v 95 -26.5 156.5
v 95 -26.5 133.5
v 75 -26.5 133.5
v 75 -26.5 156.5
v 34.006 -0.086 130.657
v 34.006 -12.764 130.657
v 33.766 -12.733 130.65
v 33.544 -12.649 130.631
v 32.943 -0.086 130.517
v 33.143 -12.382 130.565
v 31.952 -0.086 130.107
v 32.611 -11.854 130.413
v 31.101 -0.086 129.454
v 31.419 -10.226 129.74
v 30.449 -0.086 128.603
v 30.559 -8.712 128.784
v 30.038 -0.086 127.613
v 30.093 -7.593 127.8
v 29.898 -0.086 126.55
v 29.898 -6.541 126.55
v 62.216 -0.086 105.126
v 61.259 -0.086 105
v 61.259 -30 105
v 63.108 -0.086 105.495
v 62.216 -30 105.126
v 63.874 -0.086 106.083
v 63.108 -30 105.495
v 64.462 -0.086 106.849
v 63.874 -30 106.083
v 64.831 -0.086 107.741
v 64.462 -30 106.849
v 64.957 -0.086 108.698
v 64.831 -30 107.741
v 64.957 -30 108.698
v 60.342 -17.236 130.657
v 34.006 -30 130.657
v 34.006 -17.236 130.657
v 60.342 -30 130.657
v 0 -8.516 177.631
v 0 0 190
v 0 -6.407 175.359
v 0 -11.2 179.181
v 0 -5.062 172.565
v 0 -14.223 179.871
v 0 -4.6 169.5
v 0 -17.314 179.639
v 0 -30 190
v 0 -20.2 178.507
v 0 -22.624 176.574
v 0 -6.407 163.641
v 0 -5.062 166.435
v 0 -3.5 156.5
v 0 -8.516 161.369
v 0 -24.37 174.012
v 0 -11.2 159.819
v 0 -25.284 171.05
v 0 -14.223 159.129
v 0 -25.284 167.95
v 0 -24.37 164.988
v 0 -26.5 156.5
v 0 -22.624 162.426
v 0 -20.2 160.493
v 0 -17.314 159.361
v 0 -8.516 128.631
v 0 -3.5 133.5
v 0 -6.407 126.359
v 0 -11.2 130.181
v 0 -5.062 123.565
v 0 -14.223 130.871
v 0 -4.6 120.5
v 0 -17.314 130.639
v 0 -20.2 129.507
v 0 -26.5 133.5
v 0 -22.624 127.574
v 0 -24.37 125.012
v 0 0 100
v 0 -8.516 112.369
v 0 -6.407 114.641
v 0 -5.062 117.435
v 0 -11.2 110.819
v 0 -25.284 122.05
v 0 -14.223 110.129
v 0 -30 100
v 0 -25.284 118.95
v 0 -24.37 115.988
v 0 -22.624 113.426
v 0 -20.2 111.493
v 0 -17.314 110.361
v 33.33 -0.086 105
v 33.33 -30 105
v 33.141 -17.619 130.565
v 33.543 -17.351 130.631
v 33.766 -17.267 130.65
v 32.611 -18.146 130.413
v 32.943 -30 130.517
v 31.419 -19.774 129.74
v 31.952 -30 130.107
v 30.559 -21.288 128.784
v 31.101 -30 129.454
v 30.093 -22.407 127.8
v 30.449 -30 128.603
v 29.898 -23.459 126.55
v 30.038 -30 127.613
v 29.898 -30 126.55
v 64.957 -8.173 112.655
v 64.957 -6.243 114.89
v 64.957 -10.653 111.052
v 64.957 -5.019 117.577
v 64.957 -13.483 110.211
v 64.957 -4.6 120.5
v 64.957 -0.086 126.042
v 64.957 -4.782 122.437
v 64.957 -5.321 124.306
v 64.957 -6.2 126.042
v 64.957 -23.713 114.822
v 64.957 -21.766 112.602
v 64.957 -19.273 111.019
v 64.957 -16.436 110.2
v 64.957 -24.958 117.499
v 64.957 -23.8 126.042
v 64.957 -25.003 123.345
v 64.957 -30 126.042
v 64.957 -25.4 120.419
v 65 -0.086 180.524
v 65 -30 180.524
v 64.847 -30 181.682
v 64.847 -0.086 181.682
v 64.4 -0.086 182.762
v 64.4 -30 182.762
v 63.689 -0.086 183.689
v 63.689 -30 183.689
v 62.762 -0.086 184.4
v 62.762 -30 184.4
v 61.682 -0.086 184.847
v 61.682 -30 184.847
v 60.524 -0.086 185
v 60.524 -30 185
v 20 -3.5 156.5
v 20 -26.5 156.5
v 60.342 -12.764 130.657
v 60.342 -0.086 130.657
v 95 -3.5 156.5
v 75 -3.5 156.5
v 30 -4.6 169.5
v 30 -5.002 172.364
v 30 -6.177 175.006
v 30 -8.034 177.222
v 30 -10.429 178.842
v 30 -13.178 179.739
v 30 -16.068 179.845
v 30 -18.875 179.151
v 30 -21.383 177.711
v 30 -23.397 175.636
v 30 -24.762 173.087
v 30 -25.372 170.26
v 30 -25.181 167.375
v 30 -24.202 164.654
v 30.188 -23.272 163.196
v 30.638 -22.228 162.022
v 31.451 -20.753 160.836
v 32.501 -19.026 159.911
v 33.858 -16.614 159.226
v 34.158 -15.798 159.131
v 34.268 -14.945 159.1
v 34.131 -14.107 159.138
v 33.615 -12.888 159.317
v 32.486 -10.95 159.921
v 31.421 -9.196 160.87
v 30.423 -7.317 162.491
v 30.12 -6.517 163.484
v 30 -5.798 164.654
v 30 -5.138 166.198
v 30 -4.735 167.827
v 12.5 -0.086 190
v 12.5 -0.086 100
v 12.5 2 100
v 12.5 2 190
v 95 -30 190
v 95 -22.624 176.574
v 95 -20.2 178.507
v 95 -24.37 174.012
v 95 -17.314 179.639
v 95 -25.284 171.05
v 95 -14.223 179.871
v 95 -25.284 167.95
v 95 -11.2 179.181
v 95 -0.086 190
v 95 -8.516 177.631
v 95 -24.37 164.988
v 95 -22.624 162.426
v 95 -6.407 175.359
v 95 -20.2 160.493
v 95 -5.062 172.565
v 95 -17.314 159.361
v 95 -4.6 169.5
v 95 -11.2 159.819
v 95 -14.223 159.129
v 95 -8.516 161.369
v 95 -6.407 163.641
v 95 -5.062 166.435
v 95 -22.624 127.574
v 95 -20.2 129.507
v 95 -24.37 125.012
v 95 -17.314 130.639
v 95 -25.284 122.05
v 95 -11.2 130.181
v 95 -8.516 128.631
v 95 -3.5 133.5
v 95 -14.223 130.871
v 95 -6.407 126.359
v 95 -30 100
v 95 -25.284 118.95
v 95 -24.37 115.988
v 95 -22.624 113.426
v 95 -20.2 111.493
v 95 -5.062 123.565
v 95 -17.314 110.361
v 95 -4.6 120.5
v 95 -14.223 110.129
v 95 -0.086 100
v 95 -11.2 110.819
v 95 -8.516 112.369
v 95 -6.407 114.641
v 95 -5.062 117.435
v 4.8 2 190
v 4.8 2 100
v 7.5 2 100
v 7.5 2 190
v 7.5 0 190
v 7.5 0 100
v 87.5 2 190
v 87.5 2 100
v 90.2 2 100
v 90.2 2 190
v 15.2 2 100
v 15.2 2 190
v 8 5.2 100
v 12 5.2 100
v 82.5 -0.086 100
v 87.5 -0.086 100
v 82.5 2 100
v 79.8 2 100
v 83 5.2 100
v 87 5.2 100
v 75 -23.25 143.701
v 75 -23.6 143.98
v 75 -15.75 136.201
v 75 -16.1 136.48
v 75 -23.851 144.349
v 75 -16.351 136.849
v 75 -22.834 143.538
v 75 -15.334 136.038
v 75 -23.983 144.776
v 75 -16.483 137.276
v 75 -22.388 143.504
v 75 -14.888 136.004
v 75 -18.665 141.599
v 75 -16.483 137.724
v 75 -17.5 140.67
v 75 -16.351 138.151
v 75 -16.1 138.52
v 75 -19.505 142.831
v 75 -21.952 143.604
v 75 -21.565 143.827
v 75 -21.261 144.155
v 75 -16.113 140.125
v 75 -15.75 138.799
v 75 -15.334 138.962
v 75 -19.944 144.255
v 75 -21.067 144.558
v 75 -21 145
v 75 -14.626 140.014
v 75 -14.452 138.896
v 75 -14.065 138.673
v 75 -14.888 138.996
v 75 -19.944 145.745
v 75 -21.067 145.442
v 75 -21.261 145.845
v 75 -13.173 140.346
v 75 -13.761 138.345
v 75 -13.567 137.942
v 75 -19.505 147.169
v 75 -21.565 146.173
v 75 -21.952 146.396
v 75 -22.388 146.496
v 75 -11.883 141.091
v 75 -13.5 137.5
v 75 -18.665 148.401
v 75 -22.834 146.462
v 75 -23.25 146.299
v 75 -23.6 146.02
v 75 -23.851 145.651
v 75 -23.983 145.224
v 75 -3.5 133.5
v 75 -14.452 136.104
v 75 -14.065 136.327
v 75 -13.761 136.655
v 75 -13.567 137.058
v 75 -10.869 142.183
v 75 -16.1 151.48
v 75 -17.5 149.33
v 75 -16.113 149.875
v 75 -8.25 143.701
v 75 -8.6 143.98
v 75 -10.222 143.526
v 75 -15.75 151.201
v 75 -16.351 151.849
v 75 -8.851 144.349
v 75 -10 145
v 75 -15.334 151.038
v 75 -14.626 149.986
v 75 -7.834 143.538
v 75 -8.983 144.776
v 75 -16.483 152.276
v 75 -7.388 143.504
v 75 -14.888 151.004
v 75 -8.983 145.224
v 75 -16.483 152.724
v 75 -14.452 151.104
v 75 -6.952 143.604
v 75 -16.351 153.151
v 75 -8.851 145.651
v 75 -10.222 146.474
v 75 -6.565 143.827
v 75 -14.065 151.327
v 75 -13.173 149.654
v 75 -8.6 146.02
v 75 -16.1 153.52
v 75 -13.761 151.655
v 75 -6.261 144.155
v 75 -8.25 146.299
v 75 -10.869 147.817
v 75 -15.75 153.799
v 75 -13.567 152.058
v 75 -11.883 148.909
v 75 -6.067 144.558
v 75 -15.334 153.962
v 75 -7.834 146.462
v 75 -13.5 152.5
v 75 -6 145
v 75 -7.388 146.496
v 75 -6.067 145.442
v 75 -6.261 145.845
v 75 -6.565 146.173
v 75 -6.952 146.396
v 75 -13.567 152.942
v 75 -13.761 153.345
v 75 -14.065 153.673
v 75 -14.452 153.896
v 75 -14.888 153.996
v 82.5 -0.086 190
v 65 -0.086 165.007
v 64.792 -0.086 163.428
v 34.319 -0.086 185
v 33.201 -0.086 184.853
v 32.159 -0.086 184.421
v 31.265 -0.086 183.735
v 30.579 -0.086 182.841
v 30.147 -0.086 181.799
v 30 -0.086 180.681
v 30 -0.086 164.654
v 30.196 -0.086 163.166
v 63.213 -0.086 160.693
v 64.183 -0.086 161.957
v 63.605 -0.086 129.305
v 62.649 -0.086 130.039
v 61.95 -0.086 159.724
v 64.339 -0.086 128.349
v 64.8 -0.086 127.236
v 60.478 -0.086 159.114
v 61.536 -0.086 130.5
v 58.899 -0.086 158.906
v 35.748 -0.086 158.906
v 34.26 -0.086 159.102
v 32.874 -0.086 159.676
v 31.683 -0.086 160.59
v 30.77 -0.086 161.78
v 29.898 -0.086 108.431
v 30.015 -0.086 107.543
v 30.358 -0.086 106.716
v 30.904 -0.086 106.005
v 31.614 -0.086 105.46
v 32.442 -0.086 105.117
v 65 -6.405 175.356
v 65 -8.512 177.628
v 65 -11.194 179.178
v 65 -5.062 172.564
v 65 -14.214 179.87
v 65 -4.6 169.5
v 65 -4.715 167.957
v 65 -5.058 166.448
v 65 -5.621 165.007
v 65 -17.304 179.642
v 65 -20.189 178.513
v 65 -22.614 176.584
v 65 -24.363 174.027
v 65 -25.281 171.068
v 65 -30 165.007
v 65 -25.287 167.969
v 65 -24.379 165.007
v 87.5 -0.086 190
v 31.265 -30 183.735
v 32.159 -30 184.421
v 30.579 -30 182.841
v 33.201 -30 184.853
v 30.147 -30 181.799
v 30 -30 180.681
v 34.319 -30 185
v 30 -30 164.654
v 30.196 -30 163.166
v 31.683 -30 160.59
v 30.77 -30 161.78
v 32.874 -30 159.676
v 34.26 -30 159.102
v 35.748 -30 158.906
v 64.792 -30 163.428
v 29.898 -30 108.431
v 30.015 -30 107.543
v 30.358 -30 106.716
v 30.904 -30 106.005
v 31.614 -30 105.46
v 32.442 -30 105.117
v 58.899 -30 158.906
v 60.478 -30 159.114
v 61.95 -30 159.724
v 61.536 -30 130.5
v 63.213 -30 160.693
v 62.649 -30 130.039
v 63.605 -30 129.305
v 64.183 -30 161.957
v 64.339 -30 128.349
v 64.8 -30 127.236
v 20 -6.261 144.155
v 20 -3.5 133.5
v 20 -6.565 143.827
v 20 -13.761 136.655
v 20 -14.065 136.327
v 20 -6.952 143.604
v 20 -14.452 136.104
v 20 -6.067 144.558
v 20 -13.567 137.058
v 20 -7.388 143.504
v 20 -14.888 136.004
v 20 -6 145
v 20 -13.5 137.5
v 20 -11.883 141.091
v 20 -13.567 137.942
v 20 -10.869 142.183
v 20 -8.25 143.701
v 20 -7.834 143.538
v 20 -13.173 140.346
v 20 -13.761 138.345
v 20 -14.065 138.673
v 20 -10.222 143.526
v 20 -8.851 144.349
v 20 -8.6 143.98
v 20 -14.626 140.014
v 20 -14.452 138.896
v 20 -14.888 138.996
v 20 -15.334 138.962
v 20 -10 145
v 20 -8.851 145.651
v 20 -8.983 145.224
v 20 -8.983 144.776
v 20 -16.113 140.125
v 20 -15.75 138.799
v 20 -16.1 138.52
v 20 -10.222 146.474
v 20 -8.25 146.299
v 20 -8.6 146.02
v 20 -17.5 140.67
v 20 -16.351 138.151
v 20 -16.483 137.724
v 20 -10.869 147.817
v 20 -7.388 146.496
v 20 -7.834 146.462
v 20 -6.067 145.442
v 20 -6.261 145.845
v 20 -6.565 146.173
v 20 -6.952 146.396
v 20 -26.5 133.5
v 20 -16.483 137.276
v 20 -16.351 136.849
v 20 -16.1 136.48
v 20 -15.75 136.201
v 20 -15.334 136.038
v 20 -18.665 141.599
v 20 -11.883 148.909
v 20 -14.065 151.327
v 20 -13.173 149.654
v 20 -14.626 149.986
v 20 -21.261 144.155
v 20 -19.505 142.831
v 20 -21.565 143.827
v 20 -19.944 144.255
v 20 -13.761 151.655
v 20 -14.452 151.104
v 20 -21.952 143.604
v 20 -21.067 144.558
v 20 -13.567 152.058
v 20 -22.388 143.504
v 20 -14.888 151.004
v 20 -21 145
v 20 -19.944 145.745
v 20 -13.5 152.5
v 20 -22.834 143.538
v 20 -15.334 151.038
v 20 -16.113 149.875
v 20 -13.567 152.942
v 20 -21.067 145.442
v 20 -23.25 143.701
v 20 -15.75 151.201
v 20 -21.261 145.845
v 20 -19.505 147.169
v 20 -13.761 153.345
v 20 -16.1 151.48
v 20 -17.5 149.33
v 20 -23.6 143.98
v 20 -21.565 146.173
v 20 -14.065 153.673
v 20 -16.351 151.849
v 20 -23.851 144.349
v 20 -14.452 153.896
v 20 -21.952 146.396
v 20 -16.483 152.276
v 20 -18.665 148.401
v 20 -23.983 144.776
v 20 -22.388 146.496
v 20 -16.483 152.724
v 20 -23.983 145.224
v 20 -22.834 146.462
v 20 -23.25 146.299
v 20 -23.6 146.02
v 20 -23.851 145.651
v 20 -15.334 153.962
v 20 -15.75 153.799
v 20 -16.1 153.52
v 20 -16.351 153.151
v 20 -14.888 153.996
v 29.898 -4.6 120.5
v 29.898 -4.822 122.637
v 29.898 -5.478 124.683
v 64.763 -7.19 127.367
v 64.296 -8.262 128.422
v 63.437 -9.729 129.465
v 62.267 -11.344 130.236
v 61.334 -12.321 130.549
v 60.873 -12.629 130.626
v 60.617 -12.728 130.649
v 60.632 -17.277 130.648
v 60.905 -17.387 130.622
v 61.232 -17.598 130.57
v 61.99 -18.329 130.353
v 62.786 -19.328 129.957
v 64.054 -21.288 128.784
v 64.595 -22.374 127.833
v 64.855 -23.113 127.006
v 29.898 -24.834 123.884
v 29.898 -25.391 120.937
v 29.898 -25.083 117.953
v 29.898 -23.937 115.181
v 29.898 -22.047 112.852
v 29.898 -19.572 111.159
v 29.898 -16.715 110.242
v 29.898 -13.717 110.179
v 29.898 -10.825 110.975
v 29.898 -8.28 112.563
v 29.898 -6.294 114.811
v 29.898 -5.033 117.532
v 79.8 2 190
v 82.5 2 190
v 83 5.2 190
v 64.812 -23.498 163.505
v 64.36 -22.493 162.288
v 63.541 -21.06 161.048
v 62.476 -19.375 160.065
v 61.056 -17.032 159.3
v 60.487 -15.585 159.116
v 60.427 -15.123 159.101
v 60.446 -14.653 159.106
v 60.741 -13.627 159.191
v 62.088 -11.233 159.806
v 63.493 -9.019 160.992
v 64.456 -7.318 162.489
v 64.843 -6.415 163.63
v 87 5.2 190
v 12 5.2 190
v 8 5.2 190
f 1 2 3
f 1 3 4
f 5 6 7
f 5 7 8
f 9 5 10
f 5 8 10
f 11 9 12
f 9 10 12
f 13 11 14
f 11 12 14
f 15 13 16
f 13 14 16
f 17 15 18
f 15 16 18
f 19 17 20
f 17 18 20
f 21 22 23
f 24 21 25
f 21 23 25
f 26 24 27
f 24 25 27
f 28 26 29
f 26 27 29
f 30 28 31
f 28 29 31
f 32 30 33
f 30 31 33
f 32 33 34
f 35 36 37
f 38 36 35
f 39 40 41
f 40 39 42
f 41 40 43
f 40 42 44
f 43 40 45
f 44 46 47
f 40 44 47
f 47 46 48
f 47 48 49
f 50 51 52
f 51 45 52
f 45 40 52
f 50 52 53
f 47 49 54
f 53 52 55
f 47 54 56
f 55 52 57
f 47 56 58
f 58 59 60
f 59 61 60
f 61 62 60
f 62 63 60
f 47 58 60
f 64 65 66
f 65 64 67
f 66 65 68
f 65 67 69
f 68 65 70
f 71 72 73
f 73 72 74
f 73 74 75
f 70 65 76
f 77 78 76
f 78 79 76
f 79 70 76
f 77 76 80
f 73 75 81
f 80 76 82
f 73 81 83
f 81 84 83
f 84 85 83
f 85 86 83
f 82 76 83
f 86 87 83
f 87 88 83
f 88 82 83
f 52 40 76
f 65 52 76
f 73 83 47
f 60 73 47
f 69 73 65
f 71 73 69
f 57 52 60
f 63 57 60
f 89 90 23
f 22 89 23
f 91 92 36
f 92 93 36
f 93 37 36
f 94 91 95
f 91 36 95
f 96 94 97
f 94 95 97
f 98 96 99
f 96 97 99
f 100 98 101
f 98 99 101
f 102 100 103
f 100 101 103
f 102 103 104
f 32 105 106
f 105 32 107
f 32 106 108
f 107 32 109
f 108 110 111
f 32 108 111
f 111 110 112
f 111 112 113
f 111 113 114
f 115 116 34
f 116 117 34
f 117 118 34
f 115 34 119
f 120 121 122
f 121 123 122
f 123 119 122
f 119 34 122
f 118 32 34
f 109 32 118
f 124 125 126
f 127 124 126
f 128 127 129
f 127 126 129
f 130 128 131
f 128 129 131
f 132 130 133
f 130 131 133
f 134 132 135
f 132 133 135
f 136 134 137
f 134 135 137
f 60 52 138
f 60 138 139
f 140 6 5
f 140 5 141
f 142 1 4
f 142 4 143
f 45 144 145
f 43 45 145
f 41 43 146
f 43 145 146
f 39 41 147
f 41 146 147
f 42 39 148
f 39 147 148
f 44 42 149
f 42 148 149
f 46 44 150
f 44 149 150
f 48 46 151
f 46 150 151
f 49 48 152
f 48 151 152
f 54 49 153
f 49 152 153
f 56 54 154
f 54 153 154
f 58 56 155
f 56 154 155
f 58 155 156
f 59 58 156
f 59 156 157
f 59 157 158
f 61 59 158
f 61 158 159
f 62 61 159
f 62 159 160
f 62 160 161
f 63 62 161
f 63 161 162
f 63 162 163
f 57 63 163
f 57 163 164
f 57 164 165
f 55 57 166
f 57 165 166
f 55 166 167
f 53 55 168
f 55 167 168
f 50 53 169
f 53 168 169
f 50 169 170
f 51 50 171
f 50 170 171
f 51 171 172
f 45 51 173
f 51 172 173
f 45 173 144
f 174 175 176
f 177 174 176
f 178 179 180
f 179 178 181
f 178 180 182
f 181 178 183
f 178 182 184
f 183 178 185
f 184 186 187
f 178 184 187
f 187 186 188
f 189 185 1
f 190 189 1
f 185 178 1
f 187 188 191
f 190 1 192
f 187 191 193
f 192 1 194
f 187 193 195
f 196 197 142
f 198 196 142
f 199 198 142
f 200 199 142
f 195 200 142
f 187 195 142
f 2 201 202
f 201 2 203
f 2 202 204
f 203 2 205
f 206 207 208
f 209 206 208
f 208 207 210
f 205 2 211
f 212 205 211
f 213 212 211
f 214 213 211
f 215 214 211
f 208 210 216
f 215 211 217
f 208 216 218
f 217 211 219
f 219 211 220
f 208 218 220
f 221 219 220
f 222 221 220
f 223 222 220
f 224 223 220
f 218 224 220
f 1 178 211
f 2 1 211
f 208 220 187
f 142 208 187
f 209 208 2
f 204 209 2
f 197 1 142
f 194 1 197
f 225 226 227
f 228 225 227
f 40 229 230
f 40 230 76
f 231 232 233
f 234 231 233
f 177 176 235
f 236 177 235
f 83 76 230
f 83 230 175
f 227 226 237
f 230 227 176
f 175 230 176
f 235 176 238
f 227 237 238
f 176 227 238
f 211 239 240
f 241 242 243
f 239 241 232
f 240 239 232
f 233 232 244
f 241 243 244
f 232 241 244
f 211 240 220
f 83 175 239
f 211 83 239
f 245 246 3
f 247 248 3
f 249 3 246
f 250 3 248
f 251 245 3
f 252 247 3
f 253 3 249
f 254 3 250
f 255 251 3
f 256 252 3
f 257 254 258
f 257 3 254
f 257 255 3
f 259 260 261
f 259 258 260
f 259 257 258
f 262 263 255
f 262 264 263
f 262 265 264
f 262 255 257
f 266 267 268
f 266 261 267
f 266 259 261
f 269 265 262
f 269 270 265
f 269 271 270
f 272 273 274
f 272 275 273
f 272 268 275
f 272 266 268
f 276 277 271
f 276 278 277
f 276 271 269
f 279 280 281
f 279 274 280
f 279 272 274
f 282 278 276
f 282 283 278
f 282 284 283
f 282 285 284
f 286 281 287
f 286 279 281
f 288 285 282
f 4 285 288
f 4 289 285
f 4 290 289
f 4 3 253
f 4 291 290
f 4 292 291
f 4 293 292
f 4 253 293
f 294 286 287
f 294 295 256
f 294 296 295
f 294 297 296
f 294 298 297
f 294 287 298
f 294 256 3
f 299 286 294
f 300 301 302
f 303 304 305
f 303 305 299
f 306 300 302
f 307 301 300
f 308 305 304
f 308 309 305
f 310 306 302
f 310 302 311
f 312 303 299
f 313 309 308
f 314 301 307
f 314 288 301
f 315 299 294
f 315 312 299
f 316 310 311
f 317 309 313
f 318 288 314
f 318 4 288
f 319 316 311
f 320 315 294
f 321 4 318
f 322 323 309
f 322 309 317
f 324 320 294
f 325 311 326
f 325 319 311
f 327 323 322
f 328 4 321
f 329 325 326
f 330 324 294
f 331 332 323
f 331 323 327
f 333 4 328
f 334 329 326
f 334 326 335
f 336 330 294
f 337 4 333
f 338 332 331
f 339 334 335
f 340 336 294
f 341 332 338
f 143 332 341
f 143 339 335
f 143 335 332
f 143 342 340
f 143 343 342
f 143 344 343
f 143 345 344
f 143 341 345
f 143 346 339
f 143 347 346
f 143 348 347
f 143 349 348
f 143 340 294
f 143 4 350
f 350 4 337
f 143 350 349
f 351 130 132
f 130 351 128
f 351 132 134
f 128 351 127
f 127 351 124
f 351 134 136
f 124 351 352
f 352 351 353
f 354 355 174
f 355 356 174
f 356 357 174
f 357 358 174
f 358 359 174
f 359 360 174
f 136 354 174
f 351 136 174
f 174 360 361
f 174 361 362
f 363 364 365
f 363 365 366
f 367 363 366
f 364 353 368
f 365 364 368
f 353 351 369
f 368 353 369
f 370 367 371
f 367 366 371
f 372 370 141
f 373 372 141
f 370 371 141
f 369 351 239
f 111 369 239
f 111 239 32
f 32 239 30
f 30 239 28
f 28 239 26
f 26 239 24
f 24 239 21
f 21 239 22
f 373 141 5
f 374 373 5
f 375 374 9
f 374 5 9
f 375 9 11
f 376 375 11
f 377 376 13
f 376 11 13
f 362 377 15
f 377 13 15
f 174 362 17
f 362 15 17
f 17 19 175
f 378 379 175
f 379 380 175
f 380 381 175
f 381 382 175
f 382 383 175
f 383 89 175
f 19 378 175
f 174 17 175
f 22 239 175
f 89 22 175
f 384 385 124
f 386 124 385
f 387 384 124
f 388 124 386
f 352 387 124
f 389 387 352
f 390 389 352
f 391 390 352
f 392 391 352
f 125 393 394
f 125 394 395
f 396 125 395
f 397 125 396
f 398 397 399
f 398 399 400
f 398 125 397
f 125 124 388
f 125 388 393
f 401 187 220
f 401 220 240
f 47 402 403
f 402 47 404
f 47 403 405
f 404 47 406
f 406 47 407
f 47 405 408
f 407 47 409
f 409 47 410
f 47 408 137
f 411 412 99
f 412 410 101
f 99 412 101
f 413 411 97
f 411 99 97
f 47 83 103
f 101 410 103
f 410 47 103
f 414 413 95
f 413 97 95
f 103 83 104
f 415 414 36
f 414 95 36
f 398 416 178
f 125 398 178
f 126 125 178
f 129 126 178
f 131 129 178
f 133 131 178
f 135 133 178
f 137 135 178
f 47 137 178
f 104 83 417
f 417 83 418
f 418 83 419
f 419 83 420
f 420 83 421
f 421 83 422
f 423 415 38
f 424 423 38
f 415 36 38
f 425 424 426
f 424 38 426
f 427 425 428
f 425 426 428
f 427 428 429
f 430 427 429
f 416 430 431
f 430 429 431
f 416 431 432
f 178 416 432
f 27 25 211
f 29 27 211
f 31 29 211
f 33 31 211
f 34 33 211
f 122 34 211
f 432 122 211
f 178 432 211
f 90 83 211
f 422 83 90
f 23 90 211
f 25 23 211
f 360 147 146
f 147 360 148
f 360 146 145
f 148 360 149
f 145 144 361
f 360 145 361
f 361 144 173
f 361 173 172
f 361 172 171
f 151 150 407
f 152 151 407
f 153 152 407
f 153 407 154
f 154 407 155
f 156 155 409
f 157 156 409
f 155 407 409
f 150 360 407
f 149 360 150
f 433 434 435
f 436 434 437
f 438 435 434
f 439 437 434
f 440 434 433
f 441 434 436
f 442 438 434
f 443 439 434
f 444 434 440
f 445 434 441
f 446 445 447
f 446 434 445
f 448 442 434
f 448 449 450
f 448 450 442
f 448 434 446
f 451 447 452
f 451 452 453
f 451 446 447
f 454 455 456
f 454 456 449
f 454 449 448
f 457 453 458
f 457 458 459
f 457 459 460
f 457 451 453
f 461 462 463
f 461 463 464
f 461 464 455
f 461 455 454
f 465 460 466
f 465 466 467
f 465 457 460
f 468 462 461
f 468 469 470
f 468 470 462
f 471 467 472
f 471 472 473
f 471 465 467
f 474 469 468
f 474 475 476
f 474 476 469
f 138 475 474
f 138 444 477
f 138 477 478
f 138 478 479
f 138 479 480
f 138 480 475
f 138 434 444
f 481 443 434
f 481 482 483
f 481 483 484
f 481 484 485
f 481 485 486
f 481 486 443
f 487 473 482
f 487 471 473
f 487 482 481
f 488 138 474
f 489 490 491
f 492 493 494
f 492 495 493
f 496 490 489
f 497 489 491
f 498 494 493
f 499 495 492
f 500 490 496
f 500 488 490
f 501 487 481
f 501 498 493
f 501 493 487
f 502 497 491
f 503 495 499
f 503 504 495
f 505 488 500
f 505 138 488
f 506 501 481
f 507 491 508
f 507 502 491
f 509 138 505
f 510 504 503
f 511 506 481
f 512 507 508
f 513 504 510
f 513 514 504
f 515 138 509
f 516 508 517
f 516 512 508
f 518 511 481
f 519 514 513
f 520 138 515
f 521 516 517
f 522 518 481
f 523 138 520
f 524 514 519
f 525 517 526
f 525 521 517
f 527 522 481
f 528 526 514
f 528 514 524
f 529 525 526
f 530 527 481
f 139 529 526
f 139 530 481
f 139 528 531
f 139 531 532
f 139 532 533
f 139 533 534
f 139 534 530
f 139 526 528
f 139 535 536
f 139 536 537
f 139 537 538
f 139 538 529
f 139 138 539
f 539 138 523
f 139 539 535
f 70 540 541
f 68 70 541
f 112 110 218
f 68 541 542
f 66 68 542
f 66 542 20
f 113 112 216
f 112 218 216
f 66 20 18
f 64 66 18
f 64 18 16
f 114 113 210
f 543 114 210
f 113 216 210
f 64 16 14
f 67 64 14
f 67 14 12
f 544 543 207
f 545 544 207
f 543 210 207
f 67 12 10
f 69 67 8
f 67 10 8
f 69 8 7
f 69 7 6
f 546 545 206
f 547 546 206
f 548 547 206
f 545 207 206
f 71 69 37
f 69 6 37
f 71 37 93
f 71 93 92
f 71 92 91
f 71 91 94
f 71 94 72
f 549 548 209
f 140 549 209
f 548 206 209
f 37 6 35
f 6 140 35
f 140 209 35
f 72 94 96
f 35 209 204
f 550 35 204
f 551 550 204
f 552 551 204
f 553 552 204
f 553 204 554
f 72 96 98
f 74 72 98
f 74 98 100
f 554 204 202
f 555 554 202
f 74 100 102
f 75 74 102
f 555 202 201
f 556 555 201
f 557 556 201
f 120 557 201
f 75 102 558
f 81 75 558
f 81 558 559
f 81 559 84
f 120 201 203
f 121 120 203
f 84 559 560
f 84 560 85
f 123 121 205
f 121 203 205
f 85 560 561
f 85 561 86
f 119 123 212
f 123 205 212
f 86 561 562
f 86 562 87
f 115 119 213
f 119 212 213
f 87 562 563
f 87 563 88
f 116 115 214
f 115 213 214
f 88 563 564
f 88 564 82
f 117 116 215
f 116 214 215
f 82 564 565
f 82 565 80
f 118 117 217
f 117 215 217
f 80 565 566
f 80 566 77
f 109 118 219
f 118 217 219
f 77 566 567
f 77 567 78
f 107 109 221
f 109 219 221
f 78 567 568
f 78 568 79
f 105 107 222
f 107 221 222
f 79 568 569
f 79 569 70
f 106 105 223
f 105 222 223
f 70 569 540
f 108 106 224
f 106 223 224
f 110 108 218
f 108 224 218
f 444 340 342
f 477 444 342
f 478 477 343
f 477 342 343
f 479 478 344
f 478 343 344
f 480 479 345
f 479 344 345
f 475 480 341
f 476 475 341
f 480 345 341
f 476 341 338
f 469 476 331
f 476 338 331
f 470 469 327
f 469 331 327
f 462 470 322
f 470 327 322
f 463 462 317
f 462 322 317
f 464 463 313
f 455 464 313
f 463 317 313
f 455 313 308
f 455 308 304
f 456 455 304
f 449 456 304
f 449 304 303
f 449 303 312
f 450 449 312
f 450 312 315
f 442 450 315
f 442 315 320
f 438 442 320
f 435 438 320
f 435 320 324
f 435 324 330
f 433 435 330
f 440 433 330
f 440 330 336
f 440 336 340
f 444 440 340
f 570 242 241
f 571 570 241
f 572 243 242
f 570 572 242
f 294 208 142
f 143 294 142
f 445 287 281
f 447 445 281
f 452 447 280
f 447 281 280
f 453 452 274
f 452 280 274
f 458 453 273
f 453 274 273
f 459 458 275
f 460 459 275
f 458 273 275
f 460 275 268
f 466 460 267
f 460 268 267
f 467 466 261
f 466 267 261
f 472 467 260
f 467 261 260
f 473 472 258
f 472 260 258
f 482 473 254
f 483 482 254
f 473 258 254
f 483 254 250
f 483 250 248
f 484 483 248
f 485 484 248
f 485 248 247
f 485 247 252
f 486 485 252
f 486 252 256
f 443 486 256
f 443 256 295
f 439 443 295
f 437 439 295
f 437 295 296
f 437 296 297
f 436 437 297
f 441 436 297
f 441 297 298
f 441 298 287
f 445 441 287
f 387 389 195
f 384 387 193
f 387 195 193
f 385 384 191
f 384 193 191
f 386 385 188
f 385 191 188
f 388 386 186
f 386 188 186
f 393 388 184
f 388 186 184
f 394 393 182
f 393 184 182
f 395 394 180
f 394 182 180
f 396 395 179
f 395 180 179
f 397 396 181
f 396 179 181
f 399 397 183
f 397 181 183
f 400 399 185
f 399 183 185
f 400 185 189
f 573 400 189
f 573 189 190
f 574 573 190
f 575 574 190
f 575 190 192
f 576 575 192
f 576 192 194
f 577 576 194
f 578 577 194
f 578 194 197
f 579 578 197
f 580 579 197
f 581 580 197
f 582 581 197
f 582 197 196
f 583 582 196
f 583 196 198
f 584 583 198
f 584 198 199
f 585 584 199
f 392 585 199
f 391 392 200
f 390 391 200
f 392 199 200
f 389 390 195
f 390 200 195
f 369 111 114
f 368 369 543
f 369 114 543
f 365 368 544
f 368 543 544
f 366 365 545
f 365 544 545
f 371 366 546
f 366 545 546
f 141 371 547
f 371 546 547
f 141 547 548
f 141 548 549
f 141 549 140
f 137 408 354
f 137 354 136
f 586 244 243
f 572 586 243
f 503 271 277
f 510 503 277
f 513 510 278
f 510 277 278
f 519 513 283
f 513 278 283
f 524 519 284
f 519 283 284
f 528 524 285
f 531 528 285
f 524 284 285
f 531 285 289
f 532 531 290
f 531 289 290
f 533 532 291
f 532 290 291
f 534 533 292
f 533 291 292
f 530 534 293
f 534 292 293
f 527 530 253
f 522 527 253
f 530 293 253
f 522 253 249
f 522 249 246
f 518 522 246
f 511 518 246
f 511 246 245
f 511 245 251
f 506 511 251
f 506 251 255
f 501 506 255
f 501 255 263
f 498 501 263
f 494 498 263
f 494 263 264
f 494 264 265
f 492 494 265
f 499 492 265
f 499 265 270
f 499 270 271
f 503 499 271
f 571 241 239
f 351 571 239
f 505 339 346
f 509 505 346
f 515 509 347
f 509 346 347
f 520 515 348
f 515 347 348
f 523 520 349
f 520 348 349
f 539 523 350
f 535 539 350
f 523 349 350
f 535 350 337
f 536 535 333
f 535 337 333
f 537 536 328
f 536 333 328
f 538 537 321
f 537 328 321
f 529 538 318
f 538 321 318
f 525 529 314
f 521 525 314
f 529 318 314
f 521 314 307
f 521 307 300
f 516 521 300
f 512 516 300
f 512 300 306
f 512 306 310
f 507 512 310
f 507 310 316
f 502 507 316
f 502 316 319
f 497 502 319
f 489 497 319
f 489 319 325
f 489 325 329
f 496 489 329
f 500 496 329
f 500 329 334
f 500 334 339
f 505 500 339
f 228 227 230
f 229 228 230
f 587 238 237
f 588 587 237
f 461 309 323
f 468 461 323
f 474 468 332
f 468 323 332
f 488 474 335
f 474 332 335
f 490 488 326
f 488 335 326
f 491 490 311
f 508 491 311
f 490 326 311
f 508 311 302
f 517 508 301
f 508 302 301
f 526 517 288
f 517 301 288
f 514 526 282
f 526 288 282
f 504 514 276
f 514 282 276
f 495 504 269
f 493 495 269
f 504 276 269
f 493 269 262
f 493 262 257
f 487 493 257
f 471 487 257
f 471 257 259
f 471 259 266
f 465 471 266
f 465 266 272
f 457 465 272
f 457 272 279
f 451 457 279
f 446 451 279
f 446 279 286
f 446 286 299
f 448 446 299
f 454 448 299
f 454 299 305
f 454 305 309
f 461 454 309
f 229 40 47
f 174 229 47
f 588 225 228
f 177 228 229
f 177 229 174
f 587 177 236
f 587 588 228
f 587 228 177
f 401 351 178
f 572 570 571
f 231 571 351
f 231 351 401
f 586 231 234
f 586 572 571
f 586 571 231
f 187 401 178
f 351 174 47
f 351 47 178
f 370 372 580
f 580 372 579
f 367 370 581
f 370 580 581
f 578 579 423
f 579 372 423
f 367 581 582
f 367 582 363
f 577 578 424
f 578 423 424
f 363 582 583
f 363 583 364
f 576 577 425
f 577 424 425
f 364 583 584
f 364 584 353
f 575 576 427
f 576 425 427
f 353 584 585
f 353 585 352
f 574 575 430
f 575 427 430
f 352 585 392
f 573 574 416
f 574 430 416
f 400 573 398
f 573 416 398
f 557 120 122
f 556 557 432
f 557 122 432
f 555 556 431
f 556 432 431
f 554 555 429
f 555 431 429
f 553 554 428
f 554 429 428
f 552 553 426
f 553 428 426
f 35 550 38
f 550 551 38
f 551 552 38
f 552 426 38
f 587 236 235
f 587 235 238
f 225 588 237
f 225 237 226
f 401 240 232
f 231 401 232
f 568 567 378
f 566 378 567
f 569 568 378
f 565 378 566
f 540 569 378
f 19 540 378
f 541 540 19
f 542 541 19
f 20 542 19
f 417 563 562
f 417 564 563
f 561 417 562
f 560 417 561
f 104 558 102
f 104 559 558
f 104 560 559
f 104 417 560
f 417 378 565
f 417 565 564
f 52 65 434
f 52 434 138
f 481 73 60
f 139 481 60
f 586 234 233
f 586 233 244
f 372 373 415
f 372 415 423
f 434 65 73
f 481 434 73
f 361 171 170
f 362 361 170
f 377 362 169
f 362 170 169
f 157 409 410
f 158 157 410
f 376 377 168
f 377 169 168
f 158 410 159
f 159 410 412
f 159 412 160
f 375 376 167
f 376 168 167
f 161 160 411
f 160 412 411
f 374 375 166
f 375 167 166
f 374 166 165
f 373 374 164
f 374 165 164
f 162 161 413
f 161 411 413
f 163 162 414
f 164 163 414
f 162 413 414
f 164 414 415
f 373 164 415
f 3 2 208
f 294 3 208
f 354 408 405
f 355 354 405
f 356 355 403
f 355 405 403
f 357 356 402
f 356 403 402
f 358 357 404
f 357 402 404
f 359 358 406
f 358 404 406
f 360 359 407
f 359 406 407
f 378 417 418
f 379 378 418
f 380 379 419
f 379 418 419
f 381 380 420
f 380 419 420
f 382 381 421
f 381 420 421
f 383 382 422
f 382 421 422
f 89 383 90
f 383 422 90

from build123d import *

# Parameters (mm, degrees)
PAD_DEPTH       = 90
SKETCH_R        = 5
SKETCH_R_2      = 1.5
SKETCH_R_3      = 10.4
POCKET_DEPTH    = 95
POCKET001_DEPTH = 32
SKETCH005_W     = 23
SKETCH005_H     = 23
POCKET002_DEPTH = 20
SKETCH006_W     = 23
SKETCH006_H     = 23
POCKET003_DEPTH = 20


with BuildPart() as part:
    # Sketch003 → Pad (new body)
    with BuildSketch(Plane.XY.offset(100)):
        Polygon((7.5, 0), (0, 0), (0, -30), (95, -30), (95, -0.086413), (87.5, -0.086413), (87.5, 2), (90.2, 2), (87, 5.2), (83, 5.2), (79.8, 2), (82.5, 2), (82.5, -0.086413), (12.5, -0.086413), (12.5, 2), (15.2, 2), (12, 5.2), (8, 5.2), (4.8, 2), (7.5, 2), align=None)
    extrude(amount=PAD_DEPTH)

    # Sketch (on Face4 of Pad) → Pocket (cut)
    with BuildSketch(Plane(origin=(95, 0, 100), x_dir=(0, 1, 0), z_dir=(1, 0, 0))):
        with Locations((-15, 45)):
            Circle(SKETCH_R)
        with Locations((-15, 52.5)):
            Circle(SKETCH_R_2)
        with Locations((-22.5, 45)):
            Circle(SKETCH_R_2)
        with Locations((-15, 37.5)):
            Circle(SKETCH_R_2)
        with Locations((-7.5, 45)):
            Circle(SKETCH_R_2)
        with Locations((-15, 20.5)):
            Circle(SKETCH_R_3)
        with Locations((-15, 69.5)):
            Circle(SKETCH_R_3)
    extrude(amount=-POCKET_DEPTH, mode=Mode.SUBTRACT)

    # Sketch004 (on Face7 of Pocket) → Pocket001 (cut)
    with BuildSketch(Plane(origin=(0, -30, 100), x_dir=(1, 0, 0), z_dir=(0, -1, 0))):
        with BuildLine():
            Line((30, 80.681485), (30, 64.654132))
            ThreePointArc((30, 64.654132), (31.683486, 60.589837), (35.747781, 58.906351))
            Line((35.747781, 58.906351), (58.899356, 58.906351))
            ThreePointArc((58.899356, 58.906351), (63.213163, 60.693188), (65, 65.006995))
            Line((65, 80.523747), (65, 65.006995))
            ThreePointArc((65, 80.523747), (63.688936, 83.688936), (60.523747, 85))
            Line((34.318515, 85), (60.523747, 85))
            ThreePointArc((34.318515, 85), (31.264864, 83.735136), (30, 80.681485))
        make_face()
        with BuildLine():
            Line((34.00557, 30.656874), (60.341932, 30.656874))
            ThreePointArc((64.957016, 26.04179), (63.605289, 29.305147), (60.341932, 30.656874))
            Line((64.957016, 8.697674), (64.957016, 26.04179))
            ThreePointArc((61.259342, 5), (63.873992, 6.083024), (64.957016, 8.697674))
            Line((33.329898, 5), (61.259342, 5))
            ThreePointArc((29.898488, 8.43141), (30.903525, 6.005037), (33.329898, 5))
            Line((29.898488, 8.43141), (29.898488, 26.549793))
            ThreePointArc((34.00557, 30.656874), (31.101424, 29.453938), (29.898488, 26.549793))
        make_face()
    extrude(amount=-POCKET001_DEPTH, mode=Mode.SUBTRACT)

    # Sketch005 (on Face3 of Pocket001) → Pocket002 (cut)
    with BuildSketch(Plane(origin=(0, 0, 100), x_dir=(0, -1, 0), z_dir=(-1, 0, 0))):
        with Locations((15, 45)):
            Rectangle(SKETCH005_W, SKETCH005_H)
    extrude(amount=-POCKET002_DEPTH, mode=Mode.SUBTRACT)

    # Sketch006 (on Face14 of Pocket002) → Pocket003 (cut)
    with BuildSketch(Plane(origin=(95, 0, 100), x_dir=(0, 1, 0), z_dir=(1, 0, 0))):
        with Locations((-15, 45)):
            Rectangle(SKETCH006_W, SKETCH006_H)
    extrude(amount=-POCKET003_DEPTH, mode=Mode.SUBTRACT)


solid = part.part
